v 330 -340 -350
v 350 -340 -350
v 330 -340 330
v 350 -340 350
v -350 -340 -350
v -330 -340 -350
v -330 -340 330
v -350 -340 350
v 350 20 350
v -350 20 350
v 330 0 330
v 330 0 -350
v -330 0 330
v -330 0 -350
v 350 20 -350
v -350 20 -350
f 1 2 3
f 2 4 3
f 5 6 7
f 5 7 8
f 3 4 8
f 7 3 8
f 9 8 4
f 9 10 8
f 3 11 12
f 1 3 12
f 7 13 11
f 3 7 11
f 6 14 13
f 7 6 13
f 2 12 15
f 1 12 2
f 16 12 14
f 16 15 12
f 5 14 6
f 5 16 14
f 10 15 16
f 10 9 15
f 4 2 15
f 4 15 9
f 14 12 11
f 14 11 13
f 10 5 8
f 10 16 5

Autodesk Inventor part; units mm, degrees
ref_plane "YZ Plane" through (0, 0, 0) normal (1, 0, 0) x (0, 1, 0)
ref_plane "XZ Plane" through (0, 0, 0) normal (0, 1, 0) x (-1, 0, 0)
ref_plane "XY Plane" through (0, 0, 0) normal (0, 0, 1) x (1, 0, 0)
sketch "スケッチ1" plane through (0, 0, 0) normal (0, 1, 0) x (-1, 0, 0)
  line L0 (-350, 350) -> (350, 350)
  line L1 (350, 350) -> (350, -350)
  line L2 (350, -350) -> (-350, -350)
  line L3 (-350, -350) -> (-350, 350)
  line L4 (-350, 350) -> (350, -350) construction
  line L5 (350, 350) -> (-350, -350) construction
  point P0 (0, 0)
  dimension "d0" = 700
  dimension "d1" = 700
extrude "押し出し1" add sketch "スケッチ1" along normal blind 20
sketch "スケッチ2" plane through (350, 0, 350) normal (1, 0, 0) x (0, 0, -1)
  line L0 (0, 0) -> (0, 20) projected
  line L1 (0, 0) -> (700, 0)
  line L2 (700, 0) -> (700, -340)
  line L3 (700, -340) -> (0, -340)
  line L4 (0, -340) -> (0, 0)
  point P0 (350, 0)
  dimension "d4" = 700
  dimension "d5" = 340
extrude "押し出し2" add sketch "スケッチ2" against normal blind 20
sketch "スケッチ3" plane through (-350, 0, -350) normal (-1, 0, 0) x (0, 0, 1)
  line L0 (0, 20) -> (0, -340) projected
  line L1 (0, -340) -> (700, -340) projected
  line L2 (0, 0) -> (700, 0)
  line L3 (700, 0) -> (700, -340)
  line L4 (700, -340) -> (0, -340)
  line L5 (0, -340) -> (0, 0)
  point P0 (350, 0)
extrude "押し出し3" add sketch "スケッチ3" against normal blind 20
sketch "スケッチ4" plane through (-350, 20, 350) normal (0, 0, 1) x (1, 0, 0)
  line L0 (20, -20) -> (20, -360) projected
  line L1 (680, -360) -> (680, -20) projected
  line L2 (20, -20) -> (680, -20)
  line L3 (680, -20) -> (680, -360)
  line L4 (680, -360) -> (20, -360)
  line L5 (20, -360) -> (20, -20)
  point P0 (350, -20)
extrude "押し出し4" add sketch "スケッチ4" against normal blind 20
properties part number "こたつ"
